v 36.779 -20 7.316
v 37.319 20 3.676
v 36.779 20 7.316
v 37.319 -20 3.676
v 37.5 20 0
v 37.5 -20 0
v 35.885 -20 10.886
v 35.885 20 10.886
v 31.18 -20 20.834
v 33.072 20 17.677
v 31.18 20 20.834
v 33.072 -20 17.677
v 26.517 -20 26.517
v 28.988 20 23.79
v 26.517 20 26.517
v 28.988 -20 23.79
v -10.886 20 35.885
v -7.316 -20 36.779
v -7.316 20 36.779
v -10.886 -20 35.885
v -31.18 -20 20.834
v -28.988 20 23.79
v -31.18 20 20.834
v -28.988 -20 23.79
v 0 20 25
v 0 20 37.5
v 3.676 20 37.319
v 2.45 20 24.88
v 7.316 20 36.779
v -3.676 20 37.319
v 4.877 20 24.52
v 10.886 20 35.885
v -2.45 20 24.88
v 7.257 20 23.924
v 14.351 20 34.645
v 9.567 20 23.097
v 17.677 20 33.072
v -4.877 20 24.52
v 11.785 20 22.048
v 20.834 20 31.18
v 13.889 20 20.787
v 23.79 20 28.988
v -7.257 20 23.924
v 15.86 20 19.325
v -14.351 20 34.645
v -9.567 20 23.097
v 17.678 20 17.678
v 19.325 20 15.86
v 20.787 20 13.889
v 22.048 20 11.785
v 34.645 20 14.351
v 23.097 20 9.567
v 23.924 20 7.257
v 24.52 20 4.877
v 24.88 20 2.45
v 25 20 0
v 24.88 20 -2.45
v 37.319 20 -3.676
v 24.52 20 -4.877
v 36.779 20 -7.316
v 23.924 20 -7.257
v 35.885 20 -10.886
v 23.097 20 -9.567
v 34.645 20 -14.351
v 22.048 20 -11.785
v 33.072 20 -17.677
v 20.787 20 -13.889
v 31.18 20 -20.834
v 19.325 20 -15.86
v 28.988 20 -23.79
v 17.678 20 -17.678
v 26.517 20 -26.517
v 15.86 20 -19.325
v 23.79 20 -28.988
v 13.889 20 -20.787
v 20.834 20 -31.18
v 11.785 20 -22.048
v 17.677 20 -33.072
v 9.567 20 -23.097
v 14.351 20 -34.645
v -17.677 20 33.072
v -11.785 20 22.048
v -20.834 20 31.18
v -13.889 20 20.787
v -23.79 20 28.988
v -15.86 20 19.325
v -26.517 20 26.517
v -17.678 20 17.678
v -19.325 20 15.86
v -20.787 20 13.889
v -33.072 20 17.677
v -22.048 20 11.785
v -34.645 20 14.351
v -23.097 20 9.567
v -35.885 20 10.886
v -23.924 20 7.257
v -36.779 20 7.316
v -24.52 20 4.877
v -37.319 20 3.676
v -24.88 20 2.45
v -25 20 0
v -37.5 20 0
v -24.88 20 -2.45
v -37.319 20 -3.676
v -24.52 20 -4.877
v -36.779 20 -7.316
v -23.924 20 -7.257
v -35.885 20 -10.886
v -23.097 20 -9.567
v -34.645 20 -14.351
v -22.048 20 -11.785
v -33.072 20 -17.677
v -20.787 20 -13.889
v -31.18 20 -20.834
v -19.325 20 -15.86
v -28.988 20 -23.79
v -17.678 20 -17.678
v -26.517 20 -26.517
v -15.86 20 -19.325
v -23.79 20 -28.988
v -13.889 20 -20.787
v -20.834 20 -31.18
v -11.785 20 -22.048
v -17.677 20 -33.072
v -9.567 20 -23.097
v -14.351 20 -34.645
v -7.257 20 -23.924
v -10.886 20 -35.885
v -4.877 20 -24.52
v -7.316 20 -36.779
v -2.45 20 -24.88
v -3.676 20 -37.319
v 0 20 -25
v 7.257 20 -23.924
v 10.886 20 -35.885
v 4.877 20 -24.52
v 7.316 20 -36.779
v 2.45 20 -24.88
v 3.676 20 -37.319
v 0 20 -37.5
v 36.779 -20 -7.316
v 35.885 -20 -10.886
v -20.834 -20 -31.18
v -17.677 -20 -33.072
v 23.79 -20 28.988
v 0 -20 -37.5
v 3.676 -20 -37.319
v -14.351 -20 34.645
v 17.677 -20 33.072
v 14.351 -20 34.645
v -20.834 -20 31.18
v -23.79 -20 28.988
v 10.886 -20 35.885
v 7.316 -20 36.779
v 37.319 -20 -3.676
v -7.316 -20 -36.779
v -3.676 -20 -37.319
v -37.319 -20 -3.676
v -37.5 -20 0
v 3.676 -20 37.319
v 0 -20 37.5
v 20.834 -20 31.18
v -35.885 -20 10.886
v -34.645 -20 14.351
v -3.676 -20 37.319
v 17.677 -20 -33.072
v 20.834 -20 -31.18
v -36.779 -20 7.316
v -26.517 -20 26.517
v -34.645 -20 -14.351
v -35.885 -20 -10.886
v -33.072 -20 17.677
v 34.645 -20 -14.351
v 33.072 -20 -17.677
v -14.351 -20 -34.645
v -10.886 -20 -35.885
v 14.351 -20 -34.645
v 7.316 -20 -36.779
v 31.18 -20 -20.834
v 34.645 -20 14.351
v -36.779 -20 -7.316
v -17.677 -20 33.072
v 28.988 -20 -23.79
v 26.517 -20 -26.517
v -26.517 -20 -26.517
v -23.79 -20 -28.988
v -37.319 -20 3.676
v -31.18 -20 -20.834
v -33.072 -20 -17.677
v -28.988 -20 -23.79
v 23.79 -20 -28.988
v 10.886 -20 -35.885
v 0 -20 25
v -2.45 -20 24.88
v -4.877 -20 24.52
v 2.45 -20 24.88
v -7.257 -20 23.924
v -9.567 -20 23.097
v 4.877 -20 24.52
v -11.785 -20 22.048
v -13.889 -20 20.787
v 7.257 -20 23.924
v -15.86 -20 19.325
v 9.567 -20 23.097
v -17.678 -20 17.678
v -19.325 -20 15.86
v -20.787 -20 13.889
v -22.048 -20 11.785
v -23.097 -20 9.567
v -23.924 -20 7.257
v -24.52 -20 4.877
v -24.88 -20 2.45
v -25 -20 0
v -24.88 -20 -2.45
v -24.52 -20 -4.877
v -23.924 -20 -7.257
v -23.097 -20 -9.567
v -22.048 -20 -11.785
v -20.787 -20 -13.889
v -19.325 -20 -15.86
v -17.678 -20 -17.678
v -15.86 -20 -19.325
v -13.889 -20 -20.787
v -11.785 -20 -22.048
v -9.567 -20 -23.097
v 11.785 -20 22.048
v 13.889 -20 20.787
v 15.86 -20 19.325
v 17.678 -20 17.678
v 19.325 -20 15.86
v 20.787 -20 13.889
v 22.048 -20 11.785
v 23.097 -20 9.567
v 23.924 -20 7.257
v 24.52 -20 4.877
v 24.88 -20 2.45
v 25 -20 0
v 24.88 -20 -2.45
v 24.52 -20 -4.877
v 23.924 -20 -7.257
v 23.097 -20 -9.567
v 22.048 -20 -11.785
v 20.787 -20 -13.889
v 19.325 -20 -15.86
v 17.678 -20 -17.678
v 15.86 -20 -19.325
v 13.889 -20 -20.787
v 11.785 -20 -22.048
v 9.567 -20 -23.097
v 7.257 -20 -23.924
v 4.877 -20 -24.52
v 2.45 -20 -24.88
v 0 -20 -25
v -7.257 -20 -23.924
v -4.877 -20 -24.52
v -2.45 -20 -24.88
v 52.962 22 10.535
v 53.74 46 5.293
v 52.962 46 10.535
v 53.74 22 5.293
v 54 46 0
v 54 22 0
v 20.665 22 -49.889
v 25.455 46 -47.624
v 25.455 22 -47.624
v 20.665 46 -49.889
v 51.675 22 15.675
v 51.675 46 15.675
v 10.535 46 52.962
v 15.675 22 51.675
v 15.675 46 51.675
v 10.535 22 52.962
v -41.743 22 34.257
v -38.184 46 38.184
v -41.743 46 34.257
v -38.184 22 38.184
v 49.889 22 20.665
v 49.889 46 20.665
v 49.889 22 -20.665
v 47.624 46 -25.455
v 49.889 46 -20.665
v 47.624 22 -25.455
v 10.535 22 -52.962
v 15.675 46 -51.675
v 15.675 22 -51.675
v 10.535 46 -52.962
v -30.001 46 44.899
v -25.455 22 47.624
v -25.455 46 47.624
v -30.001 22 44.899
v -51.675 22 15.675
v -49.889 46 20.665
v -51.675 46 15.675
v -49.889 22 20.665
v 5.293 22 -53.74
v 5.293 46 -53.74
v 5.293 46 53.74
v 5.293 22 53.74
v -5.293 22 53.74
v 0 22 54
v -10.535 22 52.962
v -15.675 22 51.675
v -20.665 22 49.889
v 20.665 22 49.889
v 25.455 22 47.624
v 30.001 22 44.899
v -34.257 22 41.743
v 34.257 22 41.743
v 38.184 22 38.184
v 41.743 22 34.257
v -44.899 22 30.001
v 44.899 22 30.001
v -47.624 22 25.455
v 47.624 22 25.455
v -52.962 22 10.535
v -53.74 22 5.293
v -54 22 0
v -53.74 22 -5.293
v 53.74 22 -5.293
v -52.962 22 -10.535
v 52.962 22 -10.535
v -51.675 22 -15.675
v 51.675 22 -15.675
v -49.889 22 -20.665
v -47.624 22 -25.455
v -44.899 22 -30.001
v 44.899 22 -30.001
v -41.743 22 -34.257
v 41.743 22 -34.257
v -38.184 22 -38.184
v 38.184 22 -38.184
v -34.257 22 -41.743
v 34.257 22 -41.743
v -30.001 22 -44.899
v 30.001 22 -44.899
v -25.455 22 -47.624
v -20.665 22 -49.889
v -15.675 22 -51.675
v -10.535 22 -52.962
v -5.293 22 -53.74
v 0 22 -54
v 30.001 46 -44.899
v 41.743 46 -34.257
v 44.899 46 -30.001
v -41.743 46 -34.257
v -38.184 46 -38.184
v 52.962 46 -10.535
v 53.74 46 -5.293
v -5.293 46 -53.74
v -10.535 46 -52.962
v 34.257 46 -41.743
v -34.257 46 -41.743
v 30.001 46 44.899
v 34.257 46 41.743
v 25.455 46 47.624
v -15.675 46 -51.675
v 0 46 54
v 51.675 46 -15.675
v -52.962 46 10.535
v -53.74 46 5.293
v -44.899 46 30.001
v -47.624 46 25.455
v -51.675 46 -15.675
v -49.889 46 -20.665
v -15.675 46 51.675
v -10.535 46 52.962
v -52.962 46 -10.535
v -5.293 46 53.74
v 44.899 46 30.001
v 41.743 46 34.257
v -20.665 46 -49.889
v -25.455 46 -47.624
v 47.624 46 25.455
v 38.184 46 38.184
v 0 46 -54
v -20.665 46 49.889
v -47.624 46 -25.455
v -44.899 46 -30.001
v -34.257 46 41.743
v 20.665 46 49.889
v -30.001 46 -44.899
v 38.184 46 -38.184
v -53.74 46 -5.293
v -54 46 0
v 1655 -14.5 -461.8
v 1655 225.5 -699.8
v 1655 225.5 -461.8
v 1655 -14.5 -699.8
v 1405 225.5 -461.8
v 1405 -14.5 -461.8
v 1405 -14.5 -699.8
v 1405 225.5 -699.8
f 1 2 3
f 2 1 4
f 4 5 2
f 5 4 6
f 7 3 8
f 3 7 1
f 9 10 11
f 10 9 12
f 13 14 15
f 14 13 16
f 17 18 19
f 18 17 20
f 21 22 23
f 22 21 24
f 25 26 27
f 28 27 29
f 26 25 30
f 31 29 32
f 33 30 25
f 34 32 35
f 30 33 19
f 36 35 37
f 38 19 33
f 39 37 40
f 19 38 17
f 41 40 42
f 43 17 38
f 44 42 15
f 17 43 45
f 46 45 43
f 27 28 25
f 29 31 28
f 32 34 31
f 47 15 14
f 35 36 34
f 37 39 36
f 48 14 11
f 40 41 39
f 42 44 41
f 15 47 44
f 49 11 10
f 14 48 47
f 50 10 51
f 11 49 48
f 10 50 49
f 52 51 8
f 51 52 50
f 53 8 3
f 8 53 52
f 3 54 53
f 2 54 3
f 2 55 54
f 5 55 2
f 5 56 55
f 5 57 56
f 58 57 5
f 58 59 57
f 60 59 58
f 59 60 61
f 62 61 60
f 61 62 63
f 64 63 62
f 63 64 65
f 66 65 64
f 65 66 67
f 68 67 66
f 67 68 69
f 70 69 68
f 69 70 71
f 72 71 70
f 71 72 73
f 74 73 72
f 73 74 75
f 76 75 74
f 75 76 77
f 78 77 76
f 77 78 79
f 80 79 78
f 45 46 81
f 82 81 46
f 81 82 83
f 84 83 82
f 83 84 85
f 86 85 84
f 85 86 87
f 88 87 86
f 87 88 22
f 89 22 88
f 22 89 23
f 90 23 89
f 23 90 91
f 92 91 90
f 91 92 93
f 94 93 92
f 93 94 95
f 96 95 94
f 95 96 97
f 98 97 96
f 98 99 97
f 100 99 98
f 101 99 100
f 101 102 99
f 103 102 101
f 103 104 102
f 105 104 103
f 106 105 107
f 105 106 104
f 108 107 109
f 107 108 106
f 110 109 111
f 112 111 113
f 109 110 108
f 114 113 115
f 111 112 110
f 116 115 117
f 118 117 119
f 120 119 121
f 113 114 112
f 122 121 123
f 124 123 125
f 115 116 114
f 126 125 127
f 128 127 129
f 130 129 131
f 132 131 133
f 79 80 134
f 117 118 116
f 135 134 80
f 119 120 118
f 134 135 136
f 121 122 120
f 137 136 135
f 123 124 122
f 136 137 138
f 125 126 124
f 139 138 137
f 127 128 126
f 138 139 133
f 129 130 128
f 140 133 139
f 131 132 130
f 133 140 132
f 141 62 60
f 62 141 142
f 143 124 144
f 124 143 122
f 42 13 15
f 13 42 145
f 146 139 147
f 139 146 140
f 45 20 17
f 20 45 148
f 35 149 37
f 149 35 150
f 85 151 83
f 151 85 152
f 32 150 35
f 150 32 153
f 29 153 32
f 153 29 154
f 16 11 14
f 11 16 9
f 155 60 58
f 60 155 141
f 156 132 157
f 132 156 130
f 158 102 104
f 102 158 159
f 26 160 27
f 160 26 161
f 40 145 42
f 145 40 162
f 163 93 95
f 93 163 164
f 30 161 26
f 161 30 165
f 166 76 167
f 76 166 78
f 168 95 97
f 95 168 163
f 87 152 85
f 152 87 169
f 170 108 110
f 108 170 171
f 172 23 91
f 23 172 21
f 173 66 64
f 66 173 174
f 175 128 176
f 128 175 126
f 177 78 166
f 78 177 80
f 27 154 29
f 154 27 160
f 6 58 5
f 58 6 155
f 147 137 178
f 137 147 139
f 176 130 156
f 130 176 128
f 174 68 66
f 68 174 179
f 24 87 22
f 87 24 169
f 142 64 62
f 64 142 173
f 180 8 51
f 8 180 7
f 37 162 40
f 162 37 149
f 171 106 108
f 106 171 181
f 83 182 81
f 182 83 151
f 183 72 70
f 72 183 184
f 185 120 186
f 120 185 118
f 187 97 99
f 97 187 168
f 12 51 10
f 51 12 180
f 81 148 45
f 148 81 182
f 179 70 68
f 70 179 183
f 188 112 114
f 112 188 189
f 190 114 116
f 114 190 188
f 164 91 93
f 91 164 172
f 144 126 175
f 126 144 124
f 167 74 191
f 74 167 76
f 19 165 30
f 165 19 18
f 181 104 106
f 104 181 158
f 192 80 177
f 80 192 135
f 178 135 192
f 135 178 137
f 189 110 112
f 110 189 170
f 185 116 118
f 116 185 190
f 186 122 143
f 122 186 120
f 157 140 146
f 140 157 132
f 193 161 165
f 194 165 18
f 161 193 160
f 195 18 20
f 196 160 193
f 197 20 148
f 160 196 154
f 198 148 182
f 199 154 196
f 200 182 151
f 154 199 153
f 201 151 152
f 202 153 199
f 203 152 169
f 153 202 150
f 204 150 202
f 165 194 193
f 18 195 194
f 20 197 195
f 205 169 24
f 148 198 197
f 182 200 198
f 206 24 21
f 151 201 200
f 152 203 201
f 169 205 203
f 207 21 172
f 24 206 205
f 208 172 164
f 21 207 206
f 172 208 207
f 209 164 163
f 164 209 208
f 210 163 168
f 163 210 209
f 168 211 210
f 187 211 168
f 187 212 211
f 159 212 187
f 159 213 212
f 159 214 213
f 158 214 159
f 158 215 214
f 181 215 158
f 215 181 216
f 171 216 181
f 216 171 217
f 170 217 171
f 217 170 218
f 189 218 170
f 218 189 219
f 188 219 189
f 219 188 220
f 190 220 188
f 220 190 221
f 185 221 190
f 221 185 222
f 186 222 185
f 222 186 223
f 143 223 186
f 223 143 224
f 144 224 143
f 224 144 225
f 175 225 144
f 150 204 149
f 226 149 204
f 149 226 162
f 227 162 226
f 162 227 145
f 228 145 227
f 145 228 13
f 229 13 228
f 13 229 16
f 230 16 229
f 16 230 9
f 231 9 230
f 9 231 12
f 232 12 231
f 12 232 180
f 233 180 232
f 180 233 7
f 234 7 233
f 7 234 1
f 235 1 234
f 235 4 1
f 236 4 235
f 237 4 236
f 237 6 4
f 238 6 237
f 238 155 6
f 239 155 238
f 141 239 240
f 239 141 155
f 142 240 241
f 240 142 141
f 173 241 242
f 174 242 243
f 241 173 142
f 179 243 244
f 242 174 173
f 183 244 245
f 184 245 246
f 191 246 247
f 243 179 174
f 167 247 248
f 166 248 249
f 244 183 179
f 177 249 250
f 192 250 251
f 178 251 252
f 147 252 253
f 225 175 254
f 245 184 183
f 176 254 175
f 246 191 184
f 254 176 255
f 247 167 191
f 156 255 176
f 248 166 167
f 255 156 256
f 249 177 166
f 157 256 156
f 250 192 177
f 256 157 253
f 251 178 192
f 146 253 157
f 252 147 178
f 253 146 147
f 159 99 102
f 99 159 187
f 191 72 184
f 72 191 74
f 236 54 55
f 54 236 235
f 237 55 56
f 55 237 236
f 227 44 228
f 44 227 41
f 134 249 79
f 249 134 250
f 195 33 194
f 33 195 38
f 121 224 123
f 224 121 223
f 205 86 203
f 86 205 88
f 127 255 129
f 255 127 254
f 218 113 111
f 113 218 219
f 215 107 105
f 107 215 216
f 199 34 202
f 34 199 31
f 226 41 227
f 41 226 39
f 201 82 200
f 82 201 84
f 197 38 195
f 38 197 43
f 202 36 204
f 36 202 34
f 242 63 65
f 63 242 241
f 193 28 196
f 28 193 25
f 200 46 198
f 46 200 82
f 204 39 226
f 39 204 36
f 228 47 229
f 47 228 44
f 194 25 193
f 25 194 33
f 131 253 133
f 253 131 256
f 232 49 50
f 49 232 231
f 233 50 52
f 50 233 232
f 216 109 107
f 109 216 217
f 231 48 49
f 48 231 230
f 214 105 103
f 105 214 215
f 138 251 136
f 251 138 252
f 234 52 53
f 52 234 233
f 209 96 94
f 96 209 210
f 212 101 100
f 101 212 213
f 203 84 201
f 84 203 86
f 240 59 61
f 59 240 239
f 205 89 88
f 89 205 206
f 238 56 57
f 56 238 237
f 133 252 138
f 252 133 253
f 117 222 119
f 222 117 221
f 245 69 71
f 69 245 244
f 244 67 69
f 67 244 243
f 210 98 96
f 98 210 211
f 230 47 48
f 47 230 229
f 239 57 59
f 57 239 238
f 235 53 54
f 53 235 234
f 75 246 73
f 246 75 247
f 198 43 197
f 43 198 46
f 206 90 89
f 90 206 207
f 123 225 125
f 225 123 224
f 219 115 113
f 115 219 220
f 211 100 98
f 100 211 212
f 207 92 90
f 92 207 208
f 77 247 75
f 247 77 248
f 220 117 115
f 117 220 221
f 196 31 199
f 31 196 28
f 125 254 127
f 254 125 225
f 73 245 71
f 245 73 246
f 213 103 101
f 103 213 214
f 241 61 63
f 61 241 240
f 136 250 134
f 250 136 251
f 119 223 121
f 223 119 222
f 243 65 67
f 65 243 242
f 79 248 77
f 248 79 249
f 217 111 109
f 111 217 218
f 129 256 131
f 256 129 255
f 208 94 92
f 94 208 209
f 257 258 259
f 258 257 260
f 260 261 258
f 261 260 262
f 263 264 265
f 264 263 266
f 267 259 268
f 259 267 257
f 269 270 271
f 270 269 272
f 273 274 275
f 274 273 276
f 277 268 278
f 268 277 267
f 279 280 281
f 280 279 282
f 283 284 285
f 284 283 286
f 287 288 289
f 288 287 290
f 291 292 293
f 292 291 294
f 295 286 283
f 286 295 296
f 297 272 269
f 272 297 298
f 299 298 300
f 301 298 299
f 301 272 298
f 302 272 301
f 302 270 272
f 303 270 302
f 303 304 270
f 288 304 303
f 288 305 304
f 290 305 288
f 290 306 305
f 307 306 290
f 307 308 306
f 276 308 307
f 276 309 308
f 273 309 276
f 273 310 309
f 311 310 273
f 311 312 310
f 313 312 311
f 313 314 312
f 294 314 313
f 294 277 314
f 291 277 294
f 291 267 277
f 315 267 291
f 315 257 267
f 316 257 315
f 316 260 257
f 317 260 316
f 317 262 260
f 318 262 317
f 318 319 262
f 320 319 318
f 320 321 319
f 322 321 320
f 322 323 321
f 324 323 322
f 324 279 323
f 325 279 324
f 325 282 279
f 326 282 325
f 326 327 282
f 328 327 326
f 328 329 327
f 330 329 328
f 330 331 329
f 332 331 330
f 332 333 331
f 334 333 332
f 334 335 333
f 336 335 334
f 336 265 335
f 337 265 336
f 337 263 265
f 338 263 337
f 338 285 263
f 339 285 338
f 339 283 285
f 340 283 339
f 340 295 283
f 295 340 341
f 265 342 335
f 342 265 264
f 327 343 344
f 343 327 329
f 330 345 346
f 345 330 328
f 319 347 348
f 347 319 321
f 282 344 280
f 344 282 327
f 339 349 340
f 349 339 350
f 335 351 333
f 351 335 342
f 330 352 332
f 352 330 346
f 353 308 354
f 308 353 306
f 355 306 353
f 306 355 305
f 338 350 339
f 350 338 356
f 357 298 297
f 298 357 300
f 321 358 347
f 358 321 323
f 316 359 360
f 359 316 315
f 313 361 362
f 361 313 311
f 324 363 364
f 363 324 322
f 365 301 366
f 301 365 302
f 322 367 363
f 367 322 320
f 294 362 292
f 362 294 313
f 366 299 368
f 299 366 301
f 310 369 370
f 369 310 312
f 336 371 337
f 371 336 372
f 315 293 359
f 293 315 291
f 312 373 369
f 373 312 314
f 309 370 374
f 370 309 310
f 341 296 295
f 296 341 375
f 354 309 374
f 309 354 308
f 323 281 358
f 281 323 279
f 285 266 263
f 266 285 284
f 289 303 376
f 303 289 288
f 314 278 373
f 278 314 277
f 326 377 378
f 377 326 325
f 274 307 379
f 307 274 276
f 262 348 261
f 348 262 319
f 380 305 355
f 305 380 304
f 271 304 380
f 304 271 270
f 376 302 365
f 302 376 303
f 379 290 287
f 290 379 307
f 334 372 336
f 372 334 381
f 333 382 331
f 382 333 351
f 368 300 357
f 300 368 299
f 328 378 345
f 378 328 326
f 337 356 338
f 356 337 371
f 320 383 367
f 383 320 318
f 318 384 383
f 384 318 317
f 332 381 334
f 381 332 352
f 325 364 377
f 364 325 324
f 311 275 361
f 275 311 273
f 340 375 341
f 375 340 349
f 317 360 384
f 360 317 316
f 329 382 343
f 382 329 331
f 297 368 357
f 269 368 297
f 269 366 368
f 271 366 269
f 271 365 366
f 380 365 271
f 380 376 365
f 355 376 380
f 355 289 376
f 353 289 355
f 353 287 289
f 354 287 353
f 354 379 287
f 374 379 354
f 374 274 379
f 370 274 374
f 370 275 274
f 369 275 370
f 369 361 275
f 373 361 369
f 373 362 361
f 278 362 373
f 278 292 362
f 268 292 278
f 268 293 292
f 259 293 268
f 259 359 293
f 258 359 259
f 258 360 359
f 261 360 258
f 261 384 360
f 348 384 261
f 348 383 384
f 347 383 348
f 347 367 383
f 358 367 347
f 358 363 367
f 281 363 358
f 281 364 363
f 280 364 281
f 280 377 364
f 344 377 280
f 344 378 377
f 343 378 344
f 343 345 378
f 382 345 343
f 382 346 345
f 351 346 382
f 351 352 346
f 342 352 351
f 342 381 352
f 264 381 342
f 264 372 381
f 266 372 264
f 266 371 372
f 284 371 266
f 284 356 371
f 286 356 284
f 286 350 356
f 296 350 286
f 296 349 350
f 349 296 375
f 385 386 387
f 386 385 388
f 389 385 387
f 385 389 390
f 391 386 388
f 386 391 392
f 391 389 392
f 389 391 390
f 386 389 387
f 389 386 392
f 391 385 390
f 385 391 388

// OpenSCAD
// ============================================================================
// Atom Lithography Machine — Parametric OpenSCAD Module (S7.SAFETY-05)
// ============================================================================
// part_id           : S7.SAFETY-05
// parent_bom_id     : S7.SAFETY
// subsystem         : S7
// part_name         : Temizoda O2 Eksikligi Izleyici (%19.5 Alarm), ASME DN50 0.5 barg OVC Patlama Diski & 1.563 Ohm Quench Bosaltma Bankasi (Exp150, 24.0 kg)
// material          : 316L
// temp_stage        : 300 K (OVC / duvar / raf)
// vacuum_grade      : Kriyo OVC / Atmosfer
// tolerance         : O2>=19.5%, 0.5 barg ASME
// computed_mass_kg  : 24.00000
// envelope_mm       : 1910.000 x 1217.500 x 1512.200
// design_maturity   : M0_M1_DETAILED_CAD_DESIGN_ONLY
// no_lab_measurement: true
// iec61508_certified: false
// semi_s2_certified : false
// Units: millimeters (mm)
// ============================================================================

$fn = 64;

// Nominal bounding envelope parameters (mm)
bbox_x = 1910.0000;
bbox_y = 1217.5000;
bbox_z = 1512.2000;

// Part-specific parametric dimensions
dn_size = "DN50";
burst_barg = 0.5;
r_dump_ohm = 1.563;
o2_alarm_pct = 19.5;

// Interface / port parameters (mm)
port_ovc_dn50_rupture_inlet_od = 75.000;
port_ovc_dn50_rupture_inlet_bore = 50.000;

module part_S7_SAFETY_05() {
  union() {
    // ASME DN50 0.5 barg OVC rupture-disk nozzle
    rotate([90.000, 0.000, 0.000]) {
      difference() {
        cylinder(d=75.000, h=40.000, center=true);
        cylinder(d=50.000, h=42.000, center=true);
      }
    }
    // Burst disk clamping collar
    translate([0.000, 34.000, 0.000]) rotate([90.000, 0.000, 0.000]) cylinder(d=108.000, h=24.000, center=true);
    // 1.563 Ohm quench dump resistor bank
    translate([1530.000, 105.500, -580.800]) cube([250.000, 240.000, 238.000], center=true);
  }
}

// World assembly mounting transform (global machine frame, mm / deg):
// translate([-650.000, 204.500, 820.000]) rotate([0.000, 0.000, 0.000]) part_S7_SAFETY_05();

part_S7_SAFETY_05();
